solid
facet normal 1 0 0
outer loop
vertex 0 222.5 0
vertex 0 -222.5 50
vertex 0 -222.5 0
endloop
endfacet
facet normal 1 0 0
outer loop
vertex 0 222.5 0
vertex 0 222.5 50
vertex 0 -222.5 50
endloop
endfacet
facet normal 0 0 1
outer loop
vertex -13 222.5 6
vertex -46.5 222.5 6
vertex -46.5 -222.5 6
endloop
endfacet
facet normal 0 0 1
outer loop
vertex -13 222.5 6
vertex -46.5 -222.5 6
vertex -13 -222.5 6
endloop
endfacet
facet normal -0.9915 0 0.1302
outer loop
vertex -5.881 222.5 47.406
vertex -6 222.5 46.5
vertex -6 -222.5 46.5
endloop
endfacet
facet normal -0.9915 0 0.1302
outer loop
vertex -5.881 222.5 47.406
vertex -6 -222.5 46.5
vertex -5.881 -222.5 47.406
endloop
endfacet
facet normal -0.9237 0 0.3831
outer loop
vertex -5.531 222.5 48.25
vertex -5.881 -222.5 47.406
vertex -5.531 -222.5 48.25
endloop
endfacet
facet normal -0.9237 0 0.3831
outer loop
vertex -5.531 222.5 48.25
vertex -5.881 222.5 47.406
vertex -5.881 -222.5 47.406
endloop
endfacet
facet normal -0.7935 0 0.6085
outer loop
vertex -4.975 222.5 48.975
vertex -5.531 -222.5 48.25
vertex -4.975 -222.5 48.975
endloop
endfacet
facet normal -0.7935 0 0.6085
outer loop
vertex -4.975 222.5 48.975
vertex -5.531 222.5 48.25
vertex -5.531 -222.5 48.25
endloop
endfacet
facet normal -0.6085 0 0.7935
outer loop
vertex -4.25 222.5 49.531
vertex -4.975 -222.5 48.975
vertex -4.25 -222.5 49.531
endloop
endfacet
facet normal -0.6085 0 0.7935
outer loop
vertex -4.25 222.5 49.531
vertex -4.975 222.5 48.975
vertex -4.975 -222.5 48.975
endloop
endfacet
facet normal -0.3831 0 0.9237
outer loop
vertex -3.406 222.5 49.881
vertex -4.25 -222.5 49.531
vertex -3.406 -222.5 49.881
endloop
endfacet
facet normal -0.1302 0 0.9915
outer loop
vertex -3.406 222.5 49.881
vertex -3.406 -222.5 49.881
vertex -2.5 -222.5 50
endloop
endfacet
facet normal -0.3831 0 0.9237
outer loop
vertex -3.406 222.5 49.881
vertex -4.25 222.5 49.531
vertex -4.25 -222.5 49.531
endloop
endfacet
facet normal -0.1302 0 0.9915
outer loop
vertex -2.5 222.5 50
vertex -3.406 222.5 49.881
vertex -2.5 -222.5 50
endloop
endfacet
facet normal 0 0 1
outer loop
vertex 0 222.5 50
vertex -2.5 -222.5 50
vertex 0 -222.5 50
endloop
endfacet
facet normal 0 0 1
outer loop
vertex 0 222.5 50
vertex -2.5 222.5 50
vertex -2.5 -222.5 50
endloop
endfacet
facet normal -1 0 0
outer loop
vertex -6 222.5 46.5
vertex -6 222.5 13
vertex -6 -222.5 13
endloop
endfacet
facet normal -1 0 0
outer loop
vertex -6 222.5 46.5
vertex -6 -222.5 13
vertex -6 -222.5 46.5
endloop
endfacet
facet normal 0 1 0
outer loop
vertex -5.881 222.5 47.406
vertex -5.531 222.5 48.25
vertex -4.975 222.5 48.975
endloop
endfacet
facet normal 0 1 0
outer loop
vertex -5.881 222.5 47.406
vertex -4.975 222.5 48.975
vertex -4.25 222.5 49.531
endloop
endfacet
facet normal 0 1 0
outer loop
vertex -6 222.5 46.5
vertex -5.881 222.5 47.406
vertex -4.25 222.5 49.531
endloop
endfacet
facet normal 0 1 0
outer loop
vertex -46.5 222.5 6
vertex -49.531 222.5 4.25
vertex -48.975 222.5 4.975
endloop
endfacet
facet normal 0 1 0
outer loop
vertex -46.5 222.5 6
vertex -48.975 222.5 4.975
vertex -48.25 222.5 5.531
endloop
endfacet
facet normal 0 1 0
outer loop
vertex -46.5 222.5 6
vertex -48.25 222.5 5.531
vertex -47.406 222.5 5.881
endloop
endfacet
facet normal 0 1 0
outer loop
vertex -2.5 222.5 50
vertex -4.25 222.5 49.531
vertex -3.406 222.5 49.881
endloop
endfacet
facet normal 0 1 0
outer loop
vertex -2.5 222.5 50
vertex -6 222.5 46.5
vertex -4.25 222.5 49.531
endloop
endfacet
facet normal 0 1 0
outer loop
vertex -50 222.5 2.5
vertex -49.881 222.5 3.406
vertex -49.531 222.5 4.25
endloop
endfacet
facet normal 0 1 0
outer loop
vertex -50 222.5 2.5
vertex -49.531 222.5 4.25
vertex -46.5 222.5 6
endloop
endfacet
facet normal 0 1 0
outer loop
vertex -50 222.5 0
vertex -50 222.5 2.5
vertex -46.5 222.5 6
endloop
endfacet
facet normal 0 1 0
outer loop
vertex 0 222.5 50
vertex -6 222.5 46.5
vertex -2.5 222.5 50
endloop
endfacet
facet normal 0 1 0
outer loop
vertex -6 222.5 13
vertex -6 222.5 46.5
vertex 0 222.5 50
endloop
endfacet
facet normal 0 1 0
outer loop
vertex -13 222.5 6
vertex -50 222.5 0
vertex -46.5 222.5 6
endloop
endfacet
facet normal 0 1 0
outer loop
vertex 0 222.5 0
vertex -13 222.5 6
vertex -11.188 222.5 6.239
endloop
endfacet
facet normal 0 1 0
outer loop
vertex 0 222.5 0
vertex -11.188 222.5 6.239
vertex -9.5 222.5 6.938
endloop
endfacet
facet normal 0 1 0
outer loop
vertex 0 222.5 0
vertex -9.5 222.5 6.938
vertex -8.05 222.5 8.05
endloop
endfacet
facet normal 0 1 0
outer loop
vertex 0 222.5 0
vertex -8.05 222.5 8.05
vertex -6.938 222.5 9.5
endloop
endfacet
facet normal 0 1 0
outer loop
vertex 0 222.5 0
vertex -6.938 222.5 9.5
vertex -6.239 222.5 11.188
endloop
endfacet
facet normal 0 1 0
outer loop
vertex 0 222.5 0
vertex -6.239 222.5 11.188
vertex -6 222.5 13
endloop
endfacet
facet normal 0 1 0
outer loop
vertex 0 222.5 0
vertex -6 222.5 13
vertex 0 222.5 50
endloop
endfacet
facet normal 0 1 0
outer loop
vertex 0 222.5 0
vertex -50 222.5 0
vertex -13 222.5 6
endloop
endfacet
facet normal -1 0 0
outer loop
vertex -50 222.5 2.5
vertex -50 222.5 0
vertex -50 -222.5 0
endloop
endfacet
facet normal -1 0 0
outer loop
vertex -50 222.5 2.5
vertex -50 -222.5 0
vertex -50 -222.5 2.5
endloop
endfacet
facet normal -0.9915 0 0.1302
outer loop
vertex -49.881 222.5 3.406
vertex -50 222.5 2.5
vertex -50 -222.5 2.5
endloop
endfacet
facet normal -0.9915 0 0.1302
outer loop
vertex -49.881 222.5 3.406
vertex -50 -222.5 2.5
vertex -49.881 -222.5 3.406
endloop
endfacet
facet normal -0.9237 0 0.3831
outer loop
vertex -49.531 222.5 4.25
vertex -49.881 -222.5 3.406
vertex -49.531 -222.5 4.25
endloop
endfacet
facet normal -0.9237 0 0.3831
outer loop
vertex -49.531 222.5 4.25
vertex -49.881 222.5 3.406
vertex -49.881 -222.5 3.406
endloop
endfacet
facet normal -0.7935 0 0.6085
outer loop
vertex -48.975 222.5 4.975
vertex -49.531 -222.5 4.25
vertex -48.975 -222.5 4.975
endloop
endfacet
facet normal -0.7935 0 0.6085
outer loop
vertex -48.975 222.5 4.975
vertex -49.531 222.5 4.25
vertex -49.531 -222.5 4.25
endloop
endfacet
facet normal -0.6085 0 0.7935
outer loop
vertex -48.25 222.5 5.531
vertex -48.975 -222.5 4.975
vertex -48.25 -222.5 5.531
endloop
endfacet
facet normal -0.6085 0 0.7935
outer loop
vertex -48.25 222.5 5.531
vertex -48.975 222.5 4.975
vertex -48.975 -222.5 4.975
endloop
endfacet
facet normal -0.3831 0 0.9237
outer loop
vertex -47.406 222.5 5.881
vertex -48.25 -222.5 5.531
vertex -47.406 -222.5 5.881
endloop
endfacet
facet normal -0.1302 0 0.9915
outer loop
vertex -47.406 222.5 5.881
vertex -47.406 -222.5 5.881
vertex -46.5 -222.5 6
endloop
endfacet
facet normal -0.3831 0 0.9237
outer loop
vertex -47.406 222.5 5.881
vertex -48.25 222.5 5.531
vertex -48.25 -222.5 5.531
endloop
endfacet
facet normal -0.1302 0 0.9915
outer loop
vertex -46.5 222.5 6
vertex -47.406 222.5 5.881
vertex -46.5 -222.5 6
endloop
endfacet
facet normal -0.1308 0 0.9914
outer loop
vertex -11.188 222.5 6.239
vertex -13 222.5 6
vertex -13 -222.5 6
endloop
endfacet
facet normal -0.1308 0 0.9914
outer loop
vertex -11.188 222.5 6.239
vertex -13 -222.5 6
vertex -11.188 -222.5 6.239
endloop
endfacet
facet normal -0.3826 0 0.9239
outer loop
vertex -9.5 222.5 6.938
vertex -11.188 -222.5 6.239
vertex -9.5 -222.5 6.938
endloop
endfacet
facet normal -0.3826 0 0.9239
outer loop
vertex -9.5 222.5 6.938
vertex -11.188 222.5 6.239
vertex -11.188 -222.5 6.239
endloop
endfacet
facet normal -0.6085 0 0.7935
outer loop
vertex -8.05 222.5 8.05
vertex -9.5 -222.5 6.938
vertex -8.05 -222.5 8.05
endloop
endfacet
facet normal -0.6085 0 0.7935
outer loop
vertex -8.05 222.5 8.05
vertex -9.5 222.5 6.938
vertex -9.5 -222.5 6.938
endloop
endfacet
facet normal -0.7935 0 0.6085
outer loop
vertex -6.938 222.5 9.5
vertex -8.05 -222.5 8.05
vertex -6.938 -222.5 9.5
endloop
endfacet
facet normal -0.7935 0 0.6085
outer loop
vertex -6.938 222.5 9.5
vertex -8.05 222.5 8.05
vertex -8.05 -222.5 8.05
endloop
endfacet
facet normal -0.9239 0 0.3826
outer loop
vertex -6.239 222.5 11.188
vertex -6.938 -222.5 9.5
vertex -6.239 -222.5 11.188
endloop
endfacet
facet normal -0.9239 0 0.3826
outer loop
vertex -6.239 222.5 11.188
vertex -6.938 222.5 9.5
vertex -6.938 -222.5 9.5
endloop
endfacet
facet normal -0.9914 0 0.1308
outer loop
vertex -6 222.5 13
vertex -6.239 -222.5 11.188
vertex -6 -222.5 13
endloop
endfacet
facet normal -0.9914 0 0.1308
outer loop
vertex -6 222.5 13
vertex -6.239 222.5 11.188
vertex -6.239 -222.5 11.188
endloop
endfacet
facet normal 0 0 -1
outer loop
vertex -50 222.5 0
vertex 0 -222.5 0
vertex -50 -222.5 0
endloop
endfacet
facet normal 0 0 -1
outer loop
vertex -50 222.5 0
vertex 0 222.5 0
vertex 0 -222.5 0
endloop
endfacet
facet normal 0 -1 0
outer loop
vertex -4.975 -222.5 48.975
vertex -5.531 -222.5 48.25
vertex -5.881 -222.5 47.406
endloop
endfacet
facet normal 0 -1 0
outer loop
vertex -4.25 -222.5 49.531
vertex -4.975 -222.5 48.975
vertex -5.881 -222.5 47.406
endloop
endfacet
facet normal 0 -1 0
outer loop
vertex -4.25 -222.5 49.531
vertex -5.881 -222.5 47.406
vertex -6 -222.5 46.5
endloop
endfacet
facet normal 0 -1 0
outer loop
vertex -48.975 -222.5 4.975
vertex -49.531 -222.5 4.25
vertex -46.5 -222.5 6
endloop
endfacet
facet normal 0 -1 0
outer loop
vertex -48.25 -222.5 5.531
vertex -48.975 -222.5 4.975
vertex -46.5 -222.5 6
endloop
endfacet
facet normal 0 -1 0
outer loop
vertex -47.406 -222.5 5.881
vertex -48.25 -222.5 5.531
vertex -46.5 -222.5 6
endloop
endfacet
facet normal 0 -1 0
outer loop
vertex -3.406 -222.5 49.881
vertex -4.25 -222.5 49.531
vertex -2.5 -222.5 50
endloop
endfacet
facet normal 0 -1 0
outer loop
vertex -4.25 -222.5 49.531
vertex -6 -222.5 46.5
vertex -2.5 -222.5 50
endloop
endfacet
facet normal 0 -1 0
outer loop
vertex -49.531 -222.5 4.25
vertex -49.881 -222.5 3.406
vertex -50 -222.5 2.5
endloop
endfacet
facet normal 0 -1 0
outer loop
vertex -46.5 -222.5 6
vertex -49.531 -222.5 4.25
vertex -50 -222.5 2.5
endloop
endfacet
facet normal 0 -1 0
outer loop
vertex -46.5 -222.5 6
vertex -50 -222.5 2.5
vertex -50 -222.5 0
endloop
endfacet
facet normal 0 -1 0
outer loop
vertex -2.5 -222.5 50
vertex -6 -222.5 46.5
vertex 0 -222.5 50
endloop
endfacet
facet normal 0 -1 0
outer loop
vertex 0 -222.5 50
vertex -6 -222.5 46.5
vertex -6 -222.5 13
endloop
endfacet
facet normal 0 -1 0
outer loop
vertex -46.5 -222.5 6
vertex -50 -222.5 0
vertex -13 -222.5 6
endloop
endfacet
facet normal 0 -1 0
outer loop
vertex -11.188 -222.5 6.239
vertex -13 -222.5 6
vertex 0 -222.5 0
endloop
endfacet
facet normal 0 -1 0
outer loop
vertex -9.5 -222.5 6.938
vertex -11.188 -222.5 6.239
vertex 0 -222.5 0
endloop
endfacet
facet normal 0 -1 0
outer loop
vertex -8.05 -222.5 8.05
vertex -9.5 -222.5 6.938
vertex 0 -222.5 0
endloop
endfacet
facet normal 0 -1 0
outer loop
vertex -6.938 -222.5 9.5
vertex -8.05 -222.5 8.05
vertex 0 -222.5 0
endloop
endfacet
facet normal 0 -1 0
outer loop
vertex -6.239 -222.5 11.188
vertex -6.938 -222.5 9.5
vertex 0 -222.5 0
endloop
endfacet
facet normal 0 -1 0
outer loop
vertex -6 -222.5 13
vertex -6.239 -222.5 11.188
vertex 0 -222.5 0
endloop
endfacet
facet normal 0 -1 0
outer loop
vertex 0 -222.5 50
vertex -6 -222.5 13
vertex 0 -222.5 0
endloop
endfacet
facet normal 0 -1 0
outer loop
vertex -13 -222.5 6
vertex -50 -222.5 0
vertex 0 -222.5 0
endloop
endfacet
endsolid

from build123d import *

# Parameters (mm, degrees)
BOSS_EXTRUDE1_DEPTH = 222.5


with BuildPart() as part:
    # Sketch1 → Boss-Extrude1 (new, symmetric)
    with BuildSketch(Plane(origin=(0, 0, 0), x_dir=(1, 0, 0), z_dir=(0, 1, 0))):
        with BuildLine():
            Line((0, 0), (-50, 0))
            Line((-50, 0), (-50, -2.5))
            ThreePointArc((-50, -2.5), (-48.974873734, -4.974873734), (-46.5, -6))
            Line((-46.5, -6), (-13, -6))
            ThreePointArc((-13, -6), (-8.050252532, -8.050252532), (-6, -13))
            Line((-6, -13), (-6, -46.5))
            ThreePointArc((-6, -46.5), (-4.974873734, -48.974873734), (-2.5, -50))
            Line((-2.5, -50), (0, -50))
            Line((0, -50), (0, 0))
        make_face()
    extrude(amount=BOSS_EXTRUDE1_DEPTH, both=True)


solid = part.part
